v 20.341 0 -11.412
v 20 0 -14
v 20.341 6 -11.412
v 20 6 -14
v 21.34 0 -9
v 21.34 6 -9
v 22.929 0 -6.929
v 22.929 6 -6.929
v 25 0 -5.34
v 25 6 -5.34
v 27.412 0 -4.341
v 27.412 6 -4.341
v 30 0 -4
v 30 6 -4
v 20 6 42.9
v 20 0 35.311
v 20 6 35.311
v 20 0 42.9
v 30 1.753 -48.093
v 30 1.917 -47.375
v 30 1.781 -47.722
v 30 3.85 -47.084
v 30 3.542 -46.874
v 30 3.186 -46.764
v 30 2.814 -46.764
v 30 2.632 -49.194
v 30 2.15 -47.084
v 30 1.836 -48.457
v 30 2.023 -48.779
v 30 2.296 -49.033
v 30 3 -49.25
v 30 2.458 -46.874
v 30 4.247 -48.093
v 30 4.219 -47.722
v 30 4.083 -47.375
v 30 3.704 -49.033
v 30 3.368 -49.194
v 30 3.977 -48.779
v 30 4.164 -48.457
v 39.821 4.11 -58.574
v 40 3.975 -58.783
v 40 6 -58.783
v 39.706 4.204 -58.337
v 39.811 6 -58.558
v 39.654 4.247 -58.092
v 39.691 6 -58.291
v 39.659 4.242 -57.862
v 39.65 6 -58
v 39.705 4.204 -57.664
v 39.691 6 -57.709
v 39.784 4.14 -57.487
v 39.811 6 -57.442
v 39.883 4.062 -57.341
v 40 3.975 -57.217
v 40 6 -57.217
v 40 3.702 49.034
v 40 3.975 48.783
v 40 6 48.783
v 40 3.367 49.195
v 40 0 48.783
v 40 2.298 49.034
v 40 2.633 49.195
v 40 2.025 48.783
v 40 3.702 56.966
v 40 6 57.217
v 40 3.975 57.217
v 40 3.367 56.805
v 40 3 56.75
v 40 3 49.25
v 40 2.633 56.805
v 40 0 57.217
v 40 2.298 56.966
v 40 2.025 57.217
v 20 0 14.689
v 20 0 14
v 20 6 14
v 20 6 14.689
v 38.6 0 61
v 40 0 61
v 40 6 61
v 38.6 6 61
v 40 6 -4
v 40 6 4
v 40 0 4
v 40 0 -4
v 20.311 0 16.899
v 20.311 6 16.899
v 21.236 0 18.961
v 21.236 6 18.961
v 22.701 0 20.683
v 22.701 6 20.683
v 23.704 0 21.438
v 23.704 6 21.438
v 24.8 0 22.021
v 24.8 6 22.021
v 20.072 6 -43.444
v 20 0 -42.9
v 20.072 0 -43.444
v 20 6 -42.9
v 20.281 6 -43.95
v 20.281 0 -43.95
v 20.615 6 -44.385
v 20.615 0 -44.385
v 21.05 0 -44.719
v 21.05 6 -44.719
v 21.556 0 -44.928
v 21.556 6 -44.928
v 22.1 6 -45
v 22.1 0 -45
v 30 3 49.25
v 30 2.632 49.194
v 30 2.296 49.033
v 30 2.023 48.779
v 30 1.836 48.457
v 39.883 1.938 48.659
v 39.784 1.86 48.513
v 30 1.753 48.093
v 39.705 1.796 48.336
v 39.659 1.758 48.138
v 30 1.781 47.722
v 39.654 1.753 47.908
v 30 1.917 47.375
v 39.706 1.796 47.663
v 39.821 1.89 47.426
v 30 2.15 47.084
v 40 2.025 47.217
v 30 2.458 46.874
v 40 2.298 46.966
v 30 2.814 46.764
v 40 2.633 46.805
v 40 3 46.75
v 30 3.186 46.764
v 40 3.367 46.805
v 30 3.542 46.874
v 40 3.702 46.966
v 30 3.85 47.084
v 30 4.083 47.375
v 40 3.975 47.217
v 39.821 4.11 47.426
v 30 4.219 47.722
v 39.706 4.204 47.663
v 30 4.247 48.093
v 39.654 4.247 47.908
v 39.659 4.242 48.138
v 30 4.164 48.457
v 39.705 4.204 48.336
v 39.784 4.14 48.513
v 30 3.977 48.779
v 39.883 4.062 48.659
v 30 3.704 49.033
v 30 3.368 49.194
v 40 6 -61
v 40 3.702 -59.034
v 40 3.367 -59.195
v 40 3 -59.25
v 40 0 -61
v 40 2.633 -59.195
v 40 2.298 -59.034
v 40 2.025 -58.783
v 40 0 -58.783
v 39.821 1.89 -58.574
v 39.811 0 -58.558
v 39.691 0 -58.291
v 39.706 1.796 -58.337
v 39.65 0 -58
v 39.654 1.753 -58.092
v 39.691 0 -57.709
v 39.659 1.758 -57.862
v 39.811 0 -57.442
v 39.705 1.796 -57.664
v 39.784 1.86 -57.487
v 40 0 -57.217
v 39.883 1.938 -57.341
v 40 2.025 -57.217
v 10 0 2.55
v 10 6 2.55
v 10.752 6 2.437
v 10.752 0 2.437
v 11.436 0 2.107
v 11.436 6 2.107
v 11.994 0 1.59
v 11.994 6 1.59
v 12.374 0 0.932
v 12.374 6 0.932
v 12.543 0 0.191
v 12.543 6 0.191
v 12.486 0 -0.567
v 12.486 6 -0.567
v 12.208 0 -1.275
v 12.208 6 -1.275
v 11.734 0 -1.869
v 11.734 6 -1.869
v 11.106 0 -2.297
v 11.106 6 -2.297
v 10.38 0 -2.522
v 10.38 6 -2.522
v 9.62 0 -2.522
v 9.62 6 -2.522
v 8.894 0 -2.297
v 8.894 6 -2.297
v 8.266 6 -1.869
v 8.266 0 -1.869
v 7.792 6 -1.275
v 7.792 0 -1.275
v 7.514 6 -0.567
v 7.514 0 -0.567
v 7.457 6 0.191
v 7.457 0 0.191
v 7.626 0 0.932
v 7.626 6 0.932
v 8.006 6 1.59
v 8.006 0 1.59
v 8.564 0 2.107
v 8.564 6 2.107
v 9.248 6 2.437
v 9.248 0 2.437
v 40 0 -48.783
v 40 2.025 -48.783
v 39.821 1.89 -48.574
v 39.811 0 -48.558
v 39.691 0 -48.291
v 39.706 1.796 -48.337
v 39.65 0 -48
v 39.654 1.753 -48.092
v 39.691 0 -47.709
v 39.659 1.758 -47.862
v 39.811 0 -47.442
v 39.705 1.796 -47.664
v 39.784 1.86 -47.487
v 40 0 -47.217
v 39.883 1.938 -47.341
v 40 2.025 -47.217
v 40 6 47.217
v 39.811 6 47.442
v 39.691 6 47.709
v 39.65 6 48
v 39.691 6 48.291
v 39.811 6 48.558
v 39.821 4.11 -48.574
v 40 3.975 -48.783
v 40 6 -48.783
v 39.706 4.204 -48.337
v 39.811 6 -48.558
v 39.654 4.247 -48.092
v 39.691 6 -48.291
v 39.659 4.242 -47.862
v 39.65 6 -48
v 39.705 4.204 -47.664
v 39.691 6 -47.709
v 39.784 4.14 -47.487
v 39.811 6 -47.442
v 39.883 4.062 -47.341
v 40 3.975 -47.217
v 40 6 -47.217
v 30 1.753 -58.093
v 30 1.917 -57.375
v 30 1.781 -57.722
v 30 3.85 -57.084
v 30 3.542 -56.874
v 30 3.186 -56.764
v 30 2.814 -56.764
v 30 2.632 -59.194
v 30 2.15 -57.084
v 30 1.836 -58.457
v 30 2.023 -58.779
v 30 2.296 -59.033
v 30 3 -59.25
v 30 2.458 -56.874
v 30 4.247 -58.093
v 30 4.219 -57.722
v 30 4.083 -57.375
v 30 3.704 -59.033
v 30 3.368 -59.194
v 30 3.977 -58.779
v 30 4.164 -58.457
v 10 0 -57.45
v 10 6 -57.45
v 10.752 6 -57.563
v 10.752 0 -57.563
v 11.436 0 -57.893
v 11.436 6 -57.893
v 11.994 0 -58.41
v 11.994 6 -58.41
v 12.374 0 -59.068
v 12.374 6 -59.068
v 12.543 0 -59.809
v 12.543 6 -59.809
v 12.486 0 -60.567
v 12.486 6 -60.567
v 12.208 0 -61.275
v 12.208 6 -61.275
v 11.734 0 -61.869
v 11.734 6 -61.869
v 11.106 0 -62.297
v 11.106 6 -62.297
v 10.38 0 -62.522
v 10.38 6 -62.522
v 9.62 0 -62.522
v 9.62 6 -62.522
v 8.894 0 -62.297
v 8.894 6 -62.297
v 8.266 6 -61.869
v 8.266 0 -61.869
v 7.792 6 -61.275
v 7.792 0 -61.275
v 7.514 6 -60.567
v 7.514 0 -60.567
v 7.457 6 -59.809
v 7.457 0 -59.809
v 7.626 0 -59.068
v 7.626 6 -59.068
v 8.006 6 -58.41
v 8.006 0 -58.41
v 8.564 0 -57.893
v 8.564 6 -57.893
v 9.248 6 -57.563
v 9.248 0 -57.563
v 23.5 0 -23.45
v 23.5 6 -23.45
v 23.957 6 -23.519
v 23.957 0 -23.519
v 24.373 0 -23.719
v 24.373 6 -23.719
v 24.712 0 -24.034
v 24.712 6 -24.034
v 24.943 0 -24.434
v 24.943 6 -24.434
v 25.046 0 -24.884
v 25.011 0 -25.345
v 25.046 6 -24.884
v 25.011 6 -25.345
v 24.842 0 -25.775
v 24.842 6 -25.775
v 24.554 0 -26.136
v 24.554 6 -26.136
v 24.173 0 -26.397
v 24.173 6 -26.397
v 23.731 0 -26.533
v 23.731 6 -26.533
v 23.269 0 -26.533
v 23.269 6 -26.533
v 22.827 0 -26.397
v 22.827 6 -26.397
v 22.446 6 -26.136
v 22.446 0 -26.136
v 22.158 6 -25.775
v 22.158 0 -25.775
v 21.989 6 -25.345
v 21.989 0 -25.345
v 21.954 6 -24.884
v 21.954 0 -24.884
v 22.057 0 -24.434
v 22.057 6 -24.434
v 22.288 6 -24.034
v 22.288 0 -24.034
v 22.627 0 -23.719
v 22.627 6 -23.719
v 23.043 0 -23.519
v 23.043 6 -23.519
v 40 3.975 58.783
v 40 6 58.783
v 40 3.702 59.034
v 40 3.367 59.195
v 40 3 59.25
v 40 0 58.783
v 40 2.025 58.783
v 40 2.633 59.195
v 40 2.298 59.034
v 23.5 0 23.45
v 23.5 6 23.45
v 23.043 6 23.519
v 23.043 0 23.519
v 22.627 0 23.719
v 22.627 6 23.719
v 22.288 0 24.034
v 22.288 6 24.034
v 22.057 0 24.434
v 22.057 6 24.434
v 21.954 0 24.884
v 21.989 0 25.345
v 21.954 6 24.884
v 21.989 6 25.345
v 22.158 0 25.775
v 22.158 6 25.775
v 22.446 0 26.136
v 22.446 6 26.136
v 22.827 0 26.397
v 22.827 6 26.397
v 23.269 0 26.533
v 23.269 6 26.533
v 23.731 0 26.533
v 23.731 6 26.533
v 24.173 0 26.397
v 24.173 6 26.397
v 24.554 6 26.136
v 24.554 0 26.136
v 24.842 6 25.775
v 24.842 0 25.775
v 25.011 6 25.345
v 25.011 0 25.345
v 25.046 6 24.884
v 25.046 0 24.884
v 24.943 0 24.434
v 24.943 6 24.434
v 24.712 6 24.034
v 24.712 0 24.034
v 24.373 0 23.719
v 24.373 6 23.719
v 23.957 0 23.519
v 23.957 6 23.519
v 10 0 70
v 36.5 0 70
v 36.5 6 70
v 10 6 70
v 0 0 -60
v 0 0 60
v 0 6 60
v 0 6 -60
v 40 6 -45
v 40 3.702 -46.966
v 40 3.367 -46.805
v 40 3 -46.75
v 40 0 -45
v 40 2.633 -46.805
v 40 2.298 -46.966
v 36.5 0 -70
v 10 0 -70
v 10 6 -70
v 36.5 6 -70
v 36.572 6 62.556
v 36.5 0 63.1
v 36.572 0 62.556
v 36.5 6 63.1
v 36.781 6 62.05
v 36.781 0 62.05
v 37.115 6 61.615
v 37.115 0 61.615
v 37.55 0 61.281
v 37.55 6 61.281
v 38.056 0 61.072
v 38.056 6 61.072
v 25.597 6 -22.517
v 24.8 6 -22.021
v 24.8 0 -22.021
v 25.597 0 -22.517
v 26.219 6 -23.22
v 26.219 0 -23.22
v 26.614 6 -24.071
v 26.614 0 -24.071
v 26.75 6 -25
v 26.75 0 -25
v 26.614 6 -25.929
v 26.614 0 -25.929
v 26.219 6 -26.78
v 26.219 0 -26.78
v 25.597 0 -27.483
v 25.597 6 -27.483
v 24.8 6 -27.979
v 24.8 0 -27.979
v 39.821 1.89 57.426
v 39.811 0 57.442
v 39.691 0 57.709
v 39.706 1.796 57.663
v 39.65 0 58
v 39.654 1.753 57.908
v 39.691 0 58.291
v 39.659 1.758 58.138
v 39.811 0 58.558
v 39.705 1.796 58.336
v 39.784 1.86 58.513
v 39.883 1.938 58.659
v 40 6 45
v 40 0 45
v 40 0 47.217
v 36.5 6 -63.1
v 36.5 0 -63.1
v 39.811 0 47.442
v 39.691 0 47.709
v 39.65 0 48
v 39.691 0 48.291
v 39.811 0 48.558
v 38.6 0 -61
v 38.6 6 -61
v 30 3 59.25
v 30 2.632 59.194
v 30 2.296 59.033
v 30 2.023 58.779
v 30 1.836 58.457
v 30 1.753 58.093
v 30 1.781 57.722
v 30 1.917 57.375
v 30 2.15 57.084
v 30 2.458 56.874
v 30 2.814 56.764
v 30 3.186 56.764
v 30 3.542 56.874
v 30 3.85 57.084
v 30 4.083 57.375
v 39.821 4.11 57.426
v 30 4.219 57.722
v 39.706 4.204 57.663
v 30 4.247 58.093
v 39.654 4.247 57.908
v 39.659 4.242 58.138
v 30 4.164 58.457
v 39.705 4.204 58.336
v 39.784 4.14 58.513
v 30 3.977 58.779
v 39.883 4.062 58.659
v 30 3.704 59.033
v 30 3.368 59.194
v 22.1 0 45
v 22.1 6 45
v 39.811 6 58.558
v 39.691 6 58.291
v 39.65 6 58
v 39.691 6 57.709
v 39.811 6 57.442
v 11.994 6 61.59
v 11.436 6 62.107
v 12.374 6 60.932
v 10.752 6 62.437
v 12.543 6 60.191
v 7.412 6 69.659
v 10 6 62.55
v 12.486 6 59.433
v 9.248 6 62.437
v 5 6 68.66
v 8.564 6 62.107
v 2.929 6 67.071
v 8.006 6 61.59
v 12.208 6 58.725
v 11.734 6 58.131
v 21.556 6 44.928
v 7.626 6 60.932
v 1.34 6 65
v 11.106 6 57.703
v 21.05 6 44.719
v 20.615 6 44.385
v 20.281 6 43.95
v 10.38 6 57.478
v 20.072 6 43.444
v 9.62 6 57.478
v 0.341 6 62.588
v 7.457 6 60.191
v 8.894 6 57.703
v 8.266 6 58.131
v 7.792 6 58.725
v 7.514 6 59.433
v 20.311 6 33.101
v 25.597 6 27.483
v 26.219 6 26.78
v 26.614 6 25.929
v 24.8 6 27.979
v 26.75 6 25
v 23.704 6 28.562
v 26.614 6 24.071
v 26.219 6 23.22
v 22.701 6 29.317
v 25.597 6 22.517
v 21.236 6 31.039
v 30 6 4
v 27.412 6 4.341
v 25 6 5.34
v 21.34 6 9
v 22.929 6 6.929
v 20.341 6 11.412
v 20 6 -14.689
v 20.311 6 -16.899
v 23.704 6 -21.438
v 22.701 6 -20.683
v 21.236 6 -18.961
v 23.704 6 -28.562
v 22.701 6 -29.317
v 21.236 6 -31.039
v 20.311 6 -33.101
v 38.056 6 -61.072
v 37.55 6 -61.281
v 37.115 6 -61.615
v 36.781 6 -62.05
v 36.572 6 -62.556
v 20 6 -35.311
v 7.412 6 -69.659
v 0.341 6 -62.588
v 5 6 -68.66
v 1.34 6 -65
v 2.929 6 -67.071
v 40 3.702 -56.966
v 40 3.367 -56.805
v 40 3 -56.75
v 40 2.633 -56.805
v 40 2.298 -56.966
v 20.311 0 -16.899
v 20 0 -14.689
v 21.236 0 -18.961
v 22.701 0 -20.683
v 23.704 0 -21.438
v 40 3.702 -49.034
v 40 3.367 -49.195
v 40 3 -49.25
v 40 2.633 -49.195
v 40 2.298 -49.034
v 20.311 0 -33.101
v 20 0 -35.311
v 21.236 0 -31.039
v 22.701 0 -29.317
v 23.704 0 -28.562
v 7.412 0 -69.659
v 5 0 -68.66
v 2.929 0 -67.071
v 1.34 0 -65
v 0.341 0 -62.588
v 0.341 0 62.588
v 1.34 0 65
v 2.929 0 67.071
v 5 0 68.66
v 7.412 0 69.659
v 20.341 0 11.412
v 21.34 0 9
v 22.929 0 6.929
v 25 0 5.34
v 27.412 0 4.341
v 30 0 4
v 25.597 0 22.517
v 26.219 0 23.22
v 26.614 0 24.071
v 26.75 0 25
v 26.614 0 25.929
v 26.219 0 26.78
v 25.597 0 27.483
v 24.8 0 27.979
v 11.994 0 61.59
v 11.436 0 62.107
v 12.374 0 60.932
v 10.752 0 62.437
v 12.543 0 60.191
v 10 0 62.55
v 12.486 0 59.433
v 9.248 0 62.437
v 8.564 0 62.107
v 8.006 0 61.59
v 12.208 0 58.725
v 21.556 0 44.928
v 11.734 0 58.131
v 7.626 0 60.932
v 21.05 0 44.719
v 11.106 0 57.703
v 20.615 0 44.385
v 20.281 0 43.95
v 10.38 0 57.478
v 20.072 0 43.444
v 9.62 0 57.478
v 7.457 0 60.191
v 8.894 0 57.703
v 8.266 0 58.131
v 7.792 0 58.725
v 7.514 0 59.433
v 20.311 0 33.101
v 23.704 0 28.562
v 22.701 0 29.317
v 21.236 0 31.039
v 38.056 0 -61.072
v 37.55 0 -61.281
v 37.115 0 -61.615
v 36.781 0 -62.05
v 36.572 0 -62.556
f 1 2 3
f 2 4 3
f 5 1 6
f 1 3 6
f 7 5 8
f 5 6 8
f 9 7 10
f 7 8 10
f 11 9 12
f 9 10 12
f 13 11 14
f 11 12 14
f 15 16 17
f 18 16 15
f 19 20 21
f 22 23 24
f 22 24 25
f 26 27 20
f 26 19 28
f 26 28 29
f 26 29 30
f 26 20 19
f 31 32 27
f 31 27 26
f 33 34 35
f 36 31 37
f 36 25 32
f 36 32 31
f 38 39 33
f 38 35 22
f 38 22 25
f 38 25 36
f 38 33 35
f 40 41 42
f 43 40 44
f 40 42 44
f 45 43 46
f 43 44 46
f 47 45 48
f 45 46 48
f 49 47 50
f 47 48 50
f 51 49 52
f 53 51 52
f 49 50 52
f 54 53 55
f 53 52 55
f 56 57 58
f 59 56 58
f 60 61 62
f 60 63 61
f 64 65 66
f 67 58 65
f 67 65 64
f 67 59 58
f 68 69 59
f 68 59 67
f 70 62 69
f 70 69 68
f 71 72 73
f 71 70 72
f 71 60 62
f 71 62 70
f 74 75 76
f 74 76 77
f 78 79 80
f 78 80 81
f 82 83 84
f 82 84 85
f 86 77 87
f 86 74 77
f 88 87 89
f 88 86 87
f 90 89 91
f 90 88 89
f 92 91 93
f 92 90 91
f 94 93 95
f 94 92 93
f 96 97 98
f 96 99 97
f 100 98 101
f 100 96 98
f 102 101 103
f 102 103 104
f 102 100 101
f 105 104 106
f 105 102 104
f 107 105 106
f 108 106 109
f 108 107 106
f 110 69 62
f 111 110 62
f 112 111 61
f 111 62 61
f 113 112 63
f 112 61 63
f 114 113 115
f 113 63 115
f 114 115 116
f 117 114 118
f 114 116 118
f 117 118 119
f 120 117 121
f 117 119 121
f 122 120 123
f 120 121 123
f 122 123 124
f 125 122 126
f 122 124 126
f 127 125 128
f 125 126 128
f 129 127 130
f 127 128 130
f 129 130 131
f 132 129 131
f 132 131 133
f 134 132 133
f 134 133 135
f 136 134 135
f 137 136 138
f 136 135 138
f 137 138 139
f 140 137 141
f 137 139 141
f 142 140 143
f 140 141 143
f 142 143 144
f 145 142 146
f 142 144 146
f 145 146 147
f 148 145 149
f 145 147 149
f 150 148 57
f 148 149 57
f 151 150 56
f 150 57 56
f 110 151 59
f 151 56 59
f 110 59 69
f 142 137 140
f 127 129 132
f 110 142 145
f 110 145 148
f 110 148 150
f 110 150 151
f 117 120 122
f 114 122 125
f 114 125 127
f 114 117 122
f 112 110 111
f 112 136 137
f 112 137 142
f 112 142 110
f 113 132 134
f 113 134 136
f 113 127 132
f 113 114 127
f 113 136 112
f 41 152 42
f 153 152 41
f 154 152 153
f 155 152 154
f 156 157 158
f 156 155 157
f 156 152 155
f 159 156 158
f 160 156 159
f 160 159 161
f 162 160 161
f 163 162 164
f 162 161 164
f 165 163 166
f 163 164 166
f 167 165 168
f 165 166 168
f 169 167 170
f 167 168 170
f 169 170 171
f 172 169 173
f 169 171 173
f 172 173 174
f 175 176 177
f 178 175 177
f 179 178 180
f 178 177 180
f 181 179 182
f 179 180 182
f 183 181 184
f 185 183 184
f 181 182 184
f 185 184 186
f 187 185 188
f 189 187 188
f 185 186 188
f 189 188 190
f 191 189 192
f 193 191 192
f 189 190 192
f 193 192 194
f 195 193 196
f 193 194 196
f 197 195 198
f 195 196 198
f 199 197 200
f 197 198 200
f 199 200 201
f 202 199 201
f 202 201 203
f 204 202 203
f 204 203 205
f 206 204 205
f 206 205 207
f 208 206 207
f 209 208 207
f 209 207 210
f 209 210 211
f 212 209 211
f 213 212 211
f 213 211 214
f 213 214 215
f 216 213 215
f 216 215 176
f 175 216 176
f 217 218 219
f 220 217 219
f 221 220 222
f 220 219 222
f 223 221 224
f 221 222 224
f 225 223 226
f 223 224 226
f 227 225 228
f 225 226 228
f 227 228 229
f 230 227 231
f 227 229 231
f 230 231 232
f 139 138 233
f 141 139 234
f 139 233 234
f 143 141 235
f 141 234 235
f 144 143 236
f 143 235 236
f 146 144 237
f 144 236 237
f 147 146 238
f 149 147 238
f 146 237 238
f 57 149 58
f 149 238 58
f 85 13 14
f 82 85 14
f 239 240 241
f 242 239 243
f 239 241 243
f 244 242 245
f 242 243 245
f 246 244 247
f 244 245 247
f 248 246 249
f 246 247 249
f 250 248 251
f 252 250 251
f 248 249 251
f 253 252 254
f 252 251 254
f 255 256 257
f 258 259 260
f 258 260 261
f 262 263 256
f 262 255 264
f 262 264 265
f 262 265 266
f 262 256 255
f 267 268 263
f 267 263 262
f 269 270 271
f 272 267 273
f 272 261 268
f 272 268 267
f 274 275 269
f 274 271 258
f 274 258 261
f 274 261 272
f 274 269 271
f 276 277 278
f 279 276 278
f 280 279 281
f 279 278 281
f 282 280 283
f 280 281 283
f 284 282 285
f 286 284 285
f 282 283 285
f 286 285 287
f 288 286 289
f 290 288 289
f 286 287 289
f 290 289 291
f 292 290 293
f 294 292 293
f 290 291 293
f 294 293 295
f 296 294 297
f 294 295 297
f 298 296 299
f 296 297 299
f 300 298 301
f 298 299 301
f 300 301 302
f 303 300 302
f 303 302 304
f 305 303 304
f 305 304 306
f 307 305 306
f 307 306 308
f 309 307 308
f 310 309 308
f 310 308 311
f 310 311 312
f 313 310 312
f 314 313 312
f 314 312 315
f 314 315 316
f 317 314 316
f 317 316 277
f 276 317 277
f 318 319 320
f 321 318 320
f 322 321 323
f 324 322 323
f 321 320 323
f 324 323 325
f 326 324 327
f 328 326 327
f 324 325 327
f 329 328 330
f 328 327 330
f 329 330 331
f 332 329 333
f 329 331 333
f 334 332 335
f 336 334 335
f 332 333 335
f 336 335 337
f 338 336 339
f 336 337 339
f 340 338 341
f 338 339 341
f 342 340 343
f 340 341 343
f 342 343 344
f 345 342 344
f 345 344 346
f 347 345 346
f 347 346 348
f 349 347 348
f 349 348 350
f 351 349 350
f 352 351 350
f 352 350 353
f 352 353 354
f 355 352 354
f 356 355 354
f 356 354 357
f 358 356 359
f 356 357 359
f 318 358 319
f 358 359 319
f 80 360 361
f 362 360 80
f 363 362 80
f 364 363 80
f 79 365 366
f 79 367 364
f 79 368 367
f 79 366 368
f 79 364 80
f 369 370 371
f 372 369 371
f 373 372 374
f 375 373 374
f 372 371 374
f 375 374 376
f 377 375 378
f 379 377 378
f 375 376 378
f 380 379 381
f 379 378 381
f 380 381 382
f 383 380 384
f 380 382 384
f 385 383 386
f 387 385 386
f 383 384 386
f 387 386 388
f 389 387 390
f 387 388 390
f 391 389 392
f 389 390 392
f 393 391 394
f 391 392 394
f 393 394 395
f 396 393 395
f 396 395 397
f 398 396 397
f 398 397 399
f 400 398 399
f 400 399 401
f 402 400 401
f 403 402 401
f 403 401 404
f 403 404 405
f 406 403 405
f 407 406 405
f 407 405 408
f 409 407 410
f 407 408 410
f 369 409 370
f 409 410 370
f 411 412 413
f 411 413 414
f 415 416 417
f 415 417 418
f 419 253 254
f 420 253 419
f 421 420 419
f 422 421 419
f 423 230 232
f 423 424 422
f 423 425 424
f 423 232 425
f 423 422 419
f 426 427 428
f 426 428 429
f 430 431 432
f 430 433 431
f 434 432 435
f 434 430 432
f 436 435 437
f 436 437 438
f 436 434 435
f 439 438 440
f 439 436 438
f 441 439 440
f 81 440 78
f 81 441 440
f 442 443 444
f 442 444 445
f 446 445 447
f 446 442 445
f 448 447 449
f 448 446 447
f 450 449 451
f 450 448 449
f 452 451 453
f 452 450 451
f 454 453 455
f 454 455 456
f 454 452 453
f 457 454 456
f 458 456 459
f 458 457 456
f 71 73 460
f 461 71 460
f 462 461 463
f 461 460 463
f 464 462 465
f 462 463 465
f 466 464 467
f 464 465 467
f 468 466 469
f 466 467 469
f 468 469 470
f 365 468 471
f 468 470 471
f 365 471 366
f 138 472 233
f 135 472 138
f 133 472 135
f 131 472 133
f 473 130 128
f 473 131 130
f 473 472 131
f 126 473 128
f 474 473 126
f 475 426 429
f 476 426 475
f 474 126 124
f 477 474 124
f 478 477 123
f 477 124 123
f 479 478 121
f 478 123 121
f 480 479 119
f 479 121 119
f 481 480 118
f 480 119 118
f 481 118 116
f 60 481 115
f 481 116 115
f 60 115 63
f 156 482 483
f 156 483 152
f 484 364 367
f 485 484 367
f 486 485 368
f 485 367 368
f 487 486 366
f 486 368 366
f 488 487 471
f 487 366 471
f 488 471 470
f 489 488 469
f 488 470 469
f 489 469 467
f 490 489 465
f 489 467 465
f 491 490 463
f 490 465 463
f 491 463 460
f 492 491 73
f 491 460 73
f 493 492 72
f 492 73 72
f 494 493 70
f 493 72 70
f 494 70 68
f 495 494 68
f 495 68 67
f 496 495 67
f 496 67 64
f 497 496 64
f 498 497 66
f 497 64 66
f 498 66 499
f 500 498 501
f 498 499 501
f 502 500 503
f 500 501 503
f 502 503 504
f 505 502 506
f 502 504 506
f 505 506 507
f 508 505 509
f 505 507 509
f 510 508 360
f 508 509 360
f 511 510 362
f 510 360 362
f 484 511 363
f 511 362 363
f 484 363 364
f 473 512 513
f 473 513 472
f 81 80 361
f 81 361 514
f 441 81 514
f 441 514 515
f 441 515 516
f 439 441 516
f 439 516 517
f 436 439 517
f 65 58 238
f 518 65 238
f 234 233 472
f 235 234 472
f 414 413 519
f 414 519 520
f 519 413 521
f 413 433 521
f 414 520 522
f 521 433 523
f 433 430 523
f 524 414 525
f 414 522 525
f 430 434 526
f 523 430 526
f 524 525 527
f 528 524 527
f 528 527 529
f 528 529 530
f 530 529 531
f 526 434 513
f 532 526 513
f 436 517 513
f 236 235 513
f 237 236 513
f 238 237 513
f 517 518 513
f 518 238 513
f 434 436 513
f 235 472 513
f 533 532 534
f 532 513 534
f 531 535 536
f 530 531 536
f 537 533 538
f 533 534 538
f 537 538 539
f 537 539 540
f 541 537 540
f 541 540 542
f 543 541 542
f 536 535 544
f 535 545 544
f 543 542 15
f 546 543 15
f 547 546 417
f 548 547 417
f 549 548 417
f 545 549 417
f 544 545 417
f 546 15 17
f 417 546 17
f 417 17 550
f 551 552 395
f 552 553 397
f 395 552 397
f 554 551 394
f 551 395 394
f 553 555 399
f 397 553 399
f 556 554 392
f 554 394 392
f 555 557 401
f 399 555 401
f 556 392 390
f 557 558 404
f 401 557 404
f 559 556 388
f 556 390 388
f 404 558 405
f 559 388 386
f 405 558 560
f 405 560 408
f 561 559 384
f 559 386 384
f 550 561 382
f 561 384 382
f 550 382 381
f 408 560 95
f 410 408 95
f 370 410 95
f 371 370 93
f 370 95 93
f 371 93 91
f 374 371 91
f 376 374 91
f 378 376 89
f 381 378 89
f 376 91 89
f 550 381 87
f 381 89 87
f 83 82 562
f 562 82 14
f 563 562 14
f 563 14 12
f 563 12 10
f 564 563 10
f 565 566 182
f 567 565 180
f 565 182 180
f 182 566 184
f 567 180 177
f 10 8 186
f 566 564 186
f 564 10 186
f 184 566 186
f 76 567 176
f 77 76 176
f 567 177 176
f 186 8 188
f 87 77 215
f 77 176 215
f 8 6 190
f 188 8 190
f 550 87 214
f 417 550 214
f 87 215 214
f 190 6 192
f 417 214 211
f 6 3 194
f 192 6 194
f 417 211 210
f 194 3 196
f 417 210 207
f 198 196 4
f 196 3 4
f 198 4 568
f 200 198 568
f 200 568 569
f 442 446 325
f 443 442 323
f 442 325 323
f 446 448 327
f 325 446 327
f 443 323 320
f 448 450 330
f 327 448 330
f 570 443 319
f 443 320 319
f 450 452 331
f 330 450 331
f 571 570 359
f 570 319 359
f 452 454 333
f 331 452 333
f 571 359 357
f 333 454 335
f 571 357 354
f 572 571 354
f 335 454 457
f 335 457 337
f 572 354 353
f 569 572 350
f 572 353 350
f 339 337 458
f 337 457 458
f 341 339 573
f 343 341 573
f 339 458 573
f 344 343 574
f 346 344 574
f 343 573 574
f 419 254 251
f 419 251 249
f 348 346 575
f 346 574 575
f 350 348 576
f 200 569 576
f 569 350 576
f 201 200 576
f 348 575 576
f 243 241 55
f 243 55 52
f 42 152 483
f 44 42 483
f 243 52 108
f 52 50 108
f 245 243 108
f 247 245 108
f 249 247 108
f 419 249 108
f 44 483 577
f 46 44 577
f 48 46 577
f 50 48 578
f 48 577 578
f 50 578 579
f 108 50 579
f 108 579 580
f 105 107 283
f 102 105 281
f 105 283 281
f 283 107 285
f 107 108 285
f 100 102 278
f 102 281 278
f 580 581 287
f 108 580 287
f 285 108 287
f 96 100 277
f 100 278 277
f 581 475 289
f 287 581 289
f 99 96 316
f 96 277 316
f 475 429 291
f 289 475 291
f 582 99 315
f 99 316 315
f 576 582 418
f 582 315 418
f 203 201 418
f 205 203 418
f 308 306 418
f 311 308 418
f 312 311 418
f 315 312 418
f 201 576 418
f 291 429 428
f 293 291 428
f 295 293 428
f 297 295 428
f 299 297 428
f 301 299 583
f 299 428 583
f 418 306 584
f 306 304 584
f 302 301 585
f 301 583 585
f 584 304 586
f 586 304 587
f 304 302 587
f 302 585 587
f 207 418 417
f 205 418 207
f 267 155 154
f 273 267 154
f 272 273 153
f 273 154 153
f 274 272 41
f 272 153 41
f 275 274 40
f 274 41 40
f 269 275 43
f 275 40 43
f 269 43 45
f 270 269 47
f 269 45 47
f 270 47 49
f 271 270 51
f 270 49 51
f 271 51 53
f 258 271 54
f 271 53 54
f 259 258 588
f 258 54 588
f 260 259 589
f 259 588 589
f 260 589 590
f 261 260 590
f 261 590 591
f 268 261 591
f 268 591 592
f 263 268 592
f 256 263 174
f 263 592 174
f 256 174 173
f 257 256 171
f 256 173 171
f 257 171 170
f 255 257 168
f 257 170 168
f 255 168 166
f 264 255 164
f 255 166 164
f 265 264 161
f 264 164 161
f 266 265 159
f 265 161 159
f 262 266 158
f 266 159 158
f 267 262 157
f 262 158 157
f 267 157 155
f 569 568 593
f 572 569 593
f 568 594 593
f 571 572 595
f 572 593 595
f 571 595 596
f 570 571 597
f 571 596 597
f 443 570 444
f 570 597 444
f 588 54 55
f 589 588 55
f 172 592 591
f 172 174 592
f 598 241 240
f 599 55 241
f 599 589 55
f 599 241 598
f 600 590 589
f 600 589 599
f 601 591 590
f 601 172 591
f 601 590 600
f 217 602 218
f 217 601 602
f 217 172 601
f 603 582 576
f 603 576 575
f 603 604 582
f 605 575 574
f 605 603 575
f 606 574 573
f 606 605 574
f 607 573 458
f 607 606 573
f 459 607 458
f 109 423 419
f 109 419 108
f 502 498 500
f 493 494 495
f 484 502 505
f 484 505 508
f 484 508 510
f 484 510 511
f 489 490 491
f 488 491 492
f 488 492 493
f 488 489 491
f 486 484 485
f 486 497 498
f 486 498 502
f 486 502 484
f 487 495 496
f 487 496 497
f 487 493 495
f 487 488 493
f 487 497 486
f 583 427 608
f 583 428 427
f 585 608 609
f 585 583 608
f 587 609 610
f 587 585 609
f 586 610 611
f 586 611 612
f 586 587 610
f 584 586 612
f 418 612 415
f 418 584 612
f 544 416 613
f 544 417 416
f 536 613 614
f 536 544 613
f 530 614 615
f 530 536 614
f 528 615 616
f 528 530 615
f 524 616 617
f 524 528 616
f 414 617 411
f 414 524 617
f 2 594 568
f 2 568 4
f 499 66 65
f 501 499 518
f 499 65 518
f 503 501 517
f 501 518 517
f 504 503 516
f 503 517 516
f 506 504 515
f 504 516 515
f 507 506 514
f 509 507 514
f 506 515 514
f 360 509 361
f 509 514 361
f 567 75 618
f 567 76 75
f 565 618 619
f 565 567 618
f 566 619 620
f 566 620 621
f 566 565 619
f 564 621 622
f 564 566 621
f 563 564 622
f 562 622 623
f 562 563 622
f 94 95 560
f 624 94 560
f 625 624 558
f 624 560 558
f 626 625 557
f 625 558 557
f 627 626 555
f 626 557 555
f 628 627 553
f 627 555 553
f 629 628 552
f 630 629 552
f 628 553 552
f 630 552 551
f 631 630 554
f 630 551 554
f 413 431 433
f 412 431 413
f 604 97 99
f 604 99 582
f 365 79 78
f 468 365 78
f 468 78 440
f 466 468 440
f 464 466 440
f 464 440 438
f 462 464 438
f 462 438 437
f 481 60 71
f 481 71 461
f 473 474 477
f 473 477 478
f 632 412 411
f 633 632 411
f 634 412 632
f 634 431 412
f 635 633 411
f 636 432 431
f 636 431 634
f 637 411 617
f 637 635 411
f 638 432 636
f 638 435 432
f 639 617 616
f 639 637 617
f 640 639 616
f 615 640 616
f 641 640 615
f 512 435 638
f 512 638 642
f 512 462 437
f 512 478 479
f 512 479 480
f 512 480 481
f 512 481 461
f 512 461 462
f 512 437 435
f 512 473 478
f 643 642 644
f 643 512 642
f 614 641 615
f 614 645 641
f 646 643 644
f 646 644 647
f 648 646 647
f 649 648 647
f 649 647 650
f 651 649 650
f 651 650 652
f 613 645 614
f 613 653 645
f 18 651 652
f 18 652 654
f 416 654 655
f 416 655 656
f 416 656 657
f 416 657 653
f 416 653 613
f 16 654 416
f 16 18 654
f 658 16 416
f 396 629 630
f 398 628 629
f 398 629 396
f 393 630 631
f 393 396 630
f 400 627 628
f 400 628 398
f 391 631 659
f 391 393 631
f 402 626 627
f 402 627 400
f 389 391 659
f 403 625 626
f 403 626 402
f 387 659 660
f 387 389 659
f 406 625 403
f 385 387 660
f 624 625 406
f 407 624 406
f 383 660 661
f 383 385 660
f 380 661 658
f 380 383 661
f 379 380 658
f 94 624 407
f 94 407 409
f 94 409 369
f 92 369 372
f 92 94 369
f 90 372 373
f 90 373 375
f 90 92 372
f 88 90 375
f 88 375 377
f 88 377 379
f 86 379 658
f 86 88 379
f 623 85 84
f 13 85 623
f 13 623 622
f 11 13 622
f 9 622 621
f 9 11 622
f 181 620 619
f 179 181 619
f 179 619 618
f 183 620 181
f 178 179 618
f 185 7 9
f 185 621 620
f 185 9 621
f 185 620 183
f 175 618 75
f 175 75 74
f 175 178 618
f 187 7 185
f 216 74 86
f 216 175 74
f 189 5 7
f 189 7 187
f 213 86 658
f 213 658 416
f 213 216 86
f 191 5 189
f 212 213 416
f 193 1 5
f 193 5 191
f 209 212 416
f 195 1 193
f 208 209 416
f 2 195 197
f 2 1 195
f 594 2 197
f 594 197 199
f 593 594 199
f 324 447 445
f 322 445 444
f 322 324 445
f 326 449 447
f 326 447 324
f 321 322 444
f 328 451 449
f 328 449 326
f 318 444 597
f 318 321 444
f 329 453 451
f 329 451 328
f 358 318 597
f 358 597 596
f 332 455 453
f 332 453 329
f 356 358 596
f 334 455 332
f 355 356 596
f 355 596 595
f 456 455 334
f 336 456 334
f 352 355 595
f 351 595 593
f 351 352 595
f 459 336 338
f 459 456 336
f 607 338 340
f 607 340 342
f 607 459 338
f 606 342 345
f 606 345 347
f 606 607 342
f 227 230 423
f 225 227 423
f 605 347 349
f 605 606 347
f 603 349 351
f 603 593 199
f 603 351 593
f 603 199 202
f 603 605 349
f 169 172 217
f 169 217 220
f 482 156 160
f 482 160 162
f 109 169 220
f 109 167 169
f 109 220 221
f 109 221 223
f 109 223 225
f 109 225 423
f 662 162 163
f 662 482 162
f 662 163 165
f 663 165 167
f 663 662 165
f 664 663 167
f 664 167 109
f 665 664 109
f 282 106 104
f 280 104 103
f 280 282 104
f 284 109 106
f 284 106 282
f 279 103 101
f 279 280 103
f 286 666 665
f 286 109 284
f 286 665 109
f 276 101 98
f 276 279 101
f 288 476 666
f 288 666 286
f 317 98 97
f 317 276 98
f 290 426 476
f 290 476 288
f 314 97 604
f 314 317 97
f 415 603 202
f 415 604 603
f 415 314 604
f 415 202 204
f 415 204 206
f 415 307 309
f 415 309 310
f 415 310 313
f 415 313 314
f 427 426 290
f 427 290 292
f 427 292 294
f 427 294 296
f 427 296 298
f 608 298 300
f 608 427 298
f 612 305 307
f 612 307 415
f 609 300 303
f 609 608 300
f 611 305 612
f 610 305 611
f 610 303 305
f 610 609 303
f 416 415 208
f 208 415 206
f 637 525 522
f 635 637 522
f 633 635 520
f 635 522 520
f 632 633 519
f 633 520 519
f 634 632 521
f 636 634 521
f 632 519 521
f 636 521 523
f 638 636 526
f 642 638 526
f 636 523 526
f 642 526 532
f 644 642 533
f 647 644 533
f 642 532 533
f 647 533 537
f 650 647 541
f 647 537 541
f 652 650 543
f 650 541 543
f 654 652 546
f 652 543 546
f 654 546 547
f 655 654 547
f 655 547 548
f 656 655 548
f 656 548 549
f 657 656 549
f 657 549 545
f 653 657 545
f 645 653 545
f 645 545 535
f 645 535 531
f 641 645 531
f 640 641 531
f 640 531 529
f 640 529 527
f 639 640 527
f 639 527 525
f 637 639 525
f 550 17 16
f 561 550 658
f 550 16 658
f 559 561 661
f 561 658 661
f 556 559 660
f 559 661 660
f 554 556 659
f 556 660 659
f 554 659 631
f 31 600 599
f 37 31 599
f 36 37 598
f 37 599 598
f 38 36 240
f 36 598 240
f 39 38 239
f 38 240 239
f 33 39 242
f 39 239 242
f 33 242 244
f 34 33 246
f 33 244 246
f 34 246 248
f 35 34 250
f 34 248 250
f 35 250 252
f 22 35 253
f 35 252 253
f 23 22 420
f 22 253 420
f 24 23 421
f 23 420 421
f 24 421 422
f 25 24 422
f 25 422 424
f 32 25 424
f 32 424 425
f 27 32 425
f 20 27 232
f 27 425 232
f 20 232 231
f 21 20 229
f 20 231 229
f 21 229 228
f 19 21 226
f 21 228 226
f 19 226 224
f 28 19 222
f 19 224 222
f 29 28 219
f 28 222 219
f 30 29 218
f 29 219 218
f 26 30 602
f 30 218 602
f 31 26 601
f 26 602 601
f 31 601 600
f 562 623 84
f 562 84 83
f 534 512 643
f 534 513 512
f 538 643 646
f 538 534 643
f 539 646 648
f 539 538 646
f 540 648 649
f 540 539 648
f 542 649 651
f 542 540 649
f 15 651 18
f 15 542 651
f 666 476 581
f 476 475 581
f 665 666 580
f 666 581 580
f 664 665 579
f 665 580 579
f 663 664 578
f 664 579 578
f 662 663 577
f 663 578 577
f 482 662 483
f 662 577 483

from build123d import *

# Parameters (mm, degrees)
EXTRUDE_1_DEPTH     = 6
SKETCH_2_R          = 1.25
CUT_EXTRUDE_1_DEPTH = 10
SKETCH_3_R          = 1.05
CUT_EXTRUDE_2_DEPTH = 81.845531726
SKETCH_4_R          = 2.55
CUT_EXTRUDE_3_DEPTH = 81.845531783
FILLET_1_R          = 2.1
SKETCH_5_W          = 8
SKETCH_5_H          = 6
EXTRUDE_2_DEPTH     = 20
FILLET_2_R          = 10
FILLET_3_R          = 10
SKETCH_7_R          = 1.55
EXTRUDE_3_DEPTH     = 6
FILLET_4_R          = 8


with BuildPart() as part:
    # ｽｹｯﾁ1 → ﾎﾞｽ - 押し出し1 (new body)
    with BuildSketch(Plane(origin=(0, 0, 0), x_dir=(1, 0, 0), z_dir=(0, 1, 0))):
        Polygon((0, -70), (0, 70), (36.5, 70), (36.5, 61), (40, 61), (40, 45), (20, 45), (20, -45), (40, -45), (40, -61), (36.5, -61), (36.5, -70), align=None)
    extrude(amount=EXTRUDE_1_DEPTH)

    # ｽｹｯﾁ2 → ｶｯﾄ - 押し出し1 (cut)
    with BuildSketch(Plane(origin=(40, 0, 0), x_dir=(0, 0, -1), z_dir=(1, 0, 0))):
        with Locations((48, 3)):
            Circle(SKETCH_2_R)
        with Locations((58, 3)):
            Circle(SKETCH_2_R)
        with Locations(Location((-48, 3, 0), (0, 0, 180))):
            Circle(SKETCH_2_R)
        with Locations(Location((-58, 3, 0), (0, 0, 180))):
            Circle(SKETCH_2_R)
    extrude(amount=-CUT_EXTRUDE_1_DEPTH, mode=Mode.SUBTRACT)

    # ｽｹｯﾁ3 → ｶｯﾄ - 押し出し2 (cut, through all)
    with BuildSketch(Plane(origin=(0, 6, 0), x_dir=(1, 0, 0), z_dir=(0, 1, 0))):
        with Locations((40.7, 58)):
            Circle(SKETCH_3_R)
        with Locations((40.7, 48)):
            Circle(SKETCH_3_R)
        with Locations((40.7, -48)):
            Circle(SKETCH_3_R)
        with Locations((40.7, -58)):
            Circle(SKETCH_3_R)
    extrude(amount=-CUT_EXTRUDE_2_DEPTH, mode=Mode.SUBTRACT)

    # ｽｹｯﾁ4 → ｶｯﾄ - 押し出し3 (cut, through all)
    with BuildSketch(Plane(origin=(0, 6, 0), x_dir=(1, 0, 0), z_dir=(0, 1, 0))):
        with Locations(Location((10, 0, 0), (0, 0, 270))):
            Circle(SKETCH_4_R)
        with Locations(Location((10, 60, 0), (0, 0, 270))):
            Circle(SKETCH_4_R)
        with Locations(Location((10, -60, 0), (0, 0, 270))):
            Circle(SKETCH_4_R)
    extrude(amount=-CUT_EXTRUDE_3_DEPTH, mode=Mode.SUBTRACT)

    # ﾌｨﾚｯﾄ1
    fillet_1_edges = [part.edges().sort_by_distance(p)[0] for p in [
        (36.5, 3, -61),
        (20, 3, -45),
        (20, 3, 45),
        (36.5, 3, 61),
    ]]
    fillet(fillet_1_edges, radius=FILLET_1_R)

    # ｽｹｯﾁ5 → ﾎﾞｽ - 押し出し2 (add)
    with BuildSketch(Plane(origin=(20, 0, 0), x_dir=(0, 0, -1), z_dir=(1, 0, 0))):
        with Locations((0, 3)):
            Rectangle(SKETCH_5_W, SKETCH_5_H)
    extrude(amount=EXTRUDE_2_DEPTH)

    # ﾌｨﾚｯﾄ2
    fillet_2_edges = [part.edges().sort_by_distance(p)[0] for p in [
        (20, 3, 4),
        (20, 3, -4),
    ]]
    fillet(fillet_2_edges, radius=FILLET_2_R)

    # ﾌｨﾚｯﾄ3
    fillet_3_edges = [part.edges().sort_by_distance(p)[0] for p in [
        (0, 3, 70),
        (0, 3, -70),
    ]]
    fillet(fillet_3_edges, radius=FILLET_3_R)

    # ｽｹｯﾁ7 → ﾎﾞｽ - 押し出し3 (add, through all)
    # profile 1 of 2: a face of its own
    with BuildSketch(Plane(origin=(0, 6, 0), x_dir=(1, 0, 0), z_dir=(0, 1, 0))):
        with BuildLine():
            Line((23.5, 28.25), (20, 28.25))
            Line((20, 28.25), (20, 21.75))
            Line((20, 21.75), (23.5, 21.75))
            ThreePointArc((23.5, 21.75), (26.75, 25), (23.5, 28.25))
        make_face()
        with Locations(Location((23.5, 25, 0), (0, 0, 270))):
            Circle(SKETCH_7_R, mode=Mode.SUBTRACT)
    # profile 2 of 2: a face of its own
    with BuildSketch(Plane(origin=(0, 6, 0), x_dir=(1, 0, 0), z_dir=(0, 1, 0))):
        with BuildLine():
            Line((20, -21.75), (23.5, -21.75))
            ThreePointArc((23.5, -21.75), (26.75, -25), (23.5, -28.25))
            Line((23.5, -28.25), (20, -28.25))
            Line((20, -28.25), (20, -21.75))
        make_face()
        with Locations(Location((23.5, -25, 0), (0, 0, 90))):
            Circle(SKETCH_7_R, mode=Mode.SUBTRACT)
    extrude(amount=-EXTRUDE_3_DEPTH)

    # ﾌｨﾚｯﾄ4
    fillet_4_edges = [part.edges().sort_by_distance(p)[0] for p in [
        (20, 3, 28.25),
        (20, 3, 21.75),
        (20, 3, -28.25),
        (20, 3, -21.75),
    ]]
    fillet(fillet_4_edges, radius=FILLET_4_R)


solid = part.part
